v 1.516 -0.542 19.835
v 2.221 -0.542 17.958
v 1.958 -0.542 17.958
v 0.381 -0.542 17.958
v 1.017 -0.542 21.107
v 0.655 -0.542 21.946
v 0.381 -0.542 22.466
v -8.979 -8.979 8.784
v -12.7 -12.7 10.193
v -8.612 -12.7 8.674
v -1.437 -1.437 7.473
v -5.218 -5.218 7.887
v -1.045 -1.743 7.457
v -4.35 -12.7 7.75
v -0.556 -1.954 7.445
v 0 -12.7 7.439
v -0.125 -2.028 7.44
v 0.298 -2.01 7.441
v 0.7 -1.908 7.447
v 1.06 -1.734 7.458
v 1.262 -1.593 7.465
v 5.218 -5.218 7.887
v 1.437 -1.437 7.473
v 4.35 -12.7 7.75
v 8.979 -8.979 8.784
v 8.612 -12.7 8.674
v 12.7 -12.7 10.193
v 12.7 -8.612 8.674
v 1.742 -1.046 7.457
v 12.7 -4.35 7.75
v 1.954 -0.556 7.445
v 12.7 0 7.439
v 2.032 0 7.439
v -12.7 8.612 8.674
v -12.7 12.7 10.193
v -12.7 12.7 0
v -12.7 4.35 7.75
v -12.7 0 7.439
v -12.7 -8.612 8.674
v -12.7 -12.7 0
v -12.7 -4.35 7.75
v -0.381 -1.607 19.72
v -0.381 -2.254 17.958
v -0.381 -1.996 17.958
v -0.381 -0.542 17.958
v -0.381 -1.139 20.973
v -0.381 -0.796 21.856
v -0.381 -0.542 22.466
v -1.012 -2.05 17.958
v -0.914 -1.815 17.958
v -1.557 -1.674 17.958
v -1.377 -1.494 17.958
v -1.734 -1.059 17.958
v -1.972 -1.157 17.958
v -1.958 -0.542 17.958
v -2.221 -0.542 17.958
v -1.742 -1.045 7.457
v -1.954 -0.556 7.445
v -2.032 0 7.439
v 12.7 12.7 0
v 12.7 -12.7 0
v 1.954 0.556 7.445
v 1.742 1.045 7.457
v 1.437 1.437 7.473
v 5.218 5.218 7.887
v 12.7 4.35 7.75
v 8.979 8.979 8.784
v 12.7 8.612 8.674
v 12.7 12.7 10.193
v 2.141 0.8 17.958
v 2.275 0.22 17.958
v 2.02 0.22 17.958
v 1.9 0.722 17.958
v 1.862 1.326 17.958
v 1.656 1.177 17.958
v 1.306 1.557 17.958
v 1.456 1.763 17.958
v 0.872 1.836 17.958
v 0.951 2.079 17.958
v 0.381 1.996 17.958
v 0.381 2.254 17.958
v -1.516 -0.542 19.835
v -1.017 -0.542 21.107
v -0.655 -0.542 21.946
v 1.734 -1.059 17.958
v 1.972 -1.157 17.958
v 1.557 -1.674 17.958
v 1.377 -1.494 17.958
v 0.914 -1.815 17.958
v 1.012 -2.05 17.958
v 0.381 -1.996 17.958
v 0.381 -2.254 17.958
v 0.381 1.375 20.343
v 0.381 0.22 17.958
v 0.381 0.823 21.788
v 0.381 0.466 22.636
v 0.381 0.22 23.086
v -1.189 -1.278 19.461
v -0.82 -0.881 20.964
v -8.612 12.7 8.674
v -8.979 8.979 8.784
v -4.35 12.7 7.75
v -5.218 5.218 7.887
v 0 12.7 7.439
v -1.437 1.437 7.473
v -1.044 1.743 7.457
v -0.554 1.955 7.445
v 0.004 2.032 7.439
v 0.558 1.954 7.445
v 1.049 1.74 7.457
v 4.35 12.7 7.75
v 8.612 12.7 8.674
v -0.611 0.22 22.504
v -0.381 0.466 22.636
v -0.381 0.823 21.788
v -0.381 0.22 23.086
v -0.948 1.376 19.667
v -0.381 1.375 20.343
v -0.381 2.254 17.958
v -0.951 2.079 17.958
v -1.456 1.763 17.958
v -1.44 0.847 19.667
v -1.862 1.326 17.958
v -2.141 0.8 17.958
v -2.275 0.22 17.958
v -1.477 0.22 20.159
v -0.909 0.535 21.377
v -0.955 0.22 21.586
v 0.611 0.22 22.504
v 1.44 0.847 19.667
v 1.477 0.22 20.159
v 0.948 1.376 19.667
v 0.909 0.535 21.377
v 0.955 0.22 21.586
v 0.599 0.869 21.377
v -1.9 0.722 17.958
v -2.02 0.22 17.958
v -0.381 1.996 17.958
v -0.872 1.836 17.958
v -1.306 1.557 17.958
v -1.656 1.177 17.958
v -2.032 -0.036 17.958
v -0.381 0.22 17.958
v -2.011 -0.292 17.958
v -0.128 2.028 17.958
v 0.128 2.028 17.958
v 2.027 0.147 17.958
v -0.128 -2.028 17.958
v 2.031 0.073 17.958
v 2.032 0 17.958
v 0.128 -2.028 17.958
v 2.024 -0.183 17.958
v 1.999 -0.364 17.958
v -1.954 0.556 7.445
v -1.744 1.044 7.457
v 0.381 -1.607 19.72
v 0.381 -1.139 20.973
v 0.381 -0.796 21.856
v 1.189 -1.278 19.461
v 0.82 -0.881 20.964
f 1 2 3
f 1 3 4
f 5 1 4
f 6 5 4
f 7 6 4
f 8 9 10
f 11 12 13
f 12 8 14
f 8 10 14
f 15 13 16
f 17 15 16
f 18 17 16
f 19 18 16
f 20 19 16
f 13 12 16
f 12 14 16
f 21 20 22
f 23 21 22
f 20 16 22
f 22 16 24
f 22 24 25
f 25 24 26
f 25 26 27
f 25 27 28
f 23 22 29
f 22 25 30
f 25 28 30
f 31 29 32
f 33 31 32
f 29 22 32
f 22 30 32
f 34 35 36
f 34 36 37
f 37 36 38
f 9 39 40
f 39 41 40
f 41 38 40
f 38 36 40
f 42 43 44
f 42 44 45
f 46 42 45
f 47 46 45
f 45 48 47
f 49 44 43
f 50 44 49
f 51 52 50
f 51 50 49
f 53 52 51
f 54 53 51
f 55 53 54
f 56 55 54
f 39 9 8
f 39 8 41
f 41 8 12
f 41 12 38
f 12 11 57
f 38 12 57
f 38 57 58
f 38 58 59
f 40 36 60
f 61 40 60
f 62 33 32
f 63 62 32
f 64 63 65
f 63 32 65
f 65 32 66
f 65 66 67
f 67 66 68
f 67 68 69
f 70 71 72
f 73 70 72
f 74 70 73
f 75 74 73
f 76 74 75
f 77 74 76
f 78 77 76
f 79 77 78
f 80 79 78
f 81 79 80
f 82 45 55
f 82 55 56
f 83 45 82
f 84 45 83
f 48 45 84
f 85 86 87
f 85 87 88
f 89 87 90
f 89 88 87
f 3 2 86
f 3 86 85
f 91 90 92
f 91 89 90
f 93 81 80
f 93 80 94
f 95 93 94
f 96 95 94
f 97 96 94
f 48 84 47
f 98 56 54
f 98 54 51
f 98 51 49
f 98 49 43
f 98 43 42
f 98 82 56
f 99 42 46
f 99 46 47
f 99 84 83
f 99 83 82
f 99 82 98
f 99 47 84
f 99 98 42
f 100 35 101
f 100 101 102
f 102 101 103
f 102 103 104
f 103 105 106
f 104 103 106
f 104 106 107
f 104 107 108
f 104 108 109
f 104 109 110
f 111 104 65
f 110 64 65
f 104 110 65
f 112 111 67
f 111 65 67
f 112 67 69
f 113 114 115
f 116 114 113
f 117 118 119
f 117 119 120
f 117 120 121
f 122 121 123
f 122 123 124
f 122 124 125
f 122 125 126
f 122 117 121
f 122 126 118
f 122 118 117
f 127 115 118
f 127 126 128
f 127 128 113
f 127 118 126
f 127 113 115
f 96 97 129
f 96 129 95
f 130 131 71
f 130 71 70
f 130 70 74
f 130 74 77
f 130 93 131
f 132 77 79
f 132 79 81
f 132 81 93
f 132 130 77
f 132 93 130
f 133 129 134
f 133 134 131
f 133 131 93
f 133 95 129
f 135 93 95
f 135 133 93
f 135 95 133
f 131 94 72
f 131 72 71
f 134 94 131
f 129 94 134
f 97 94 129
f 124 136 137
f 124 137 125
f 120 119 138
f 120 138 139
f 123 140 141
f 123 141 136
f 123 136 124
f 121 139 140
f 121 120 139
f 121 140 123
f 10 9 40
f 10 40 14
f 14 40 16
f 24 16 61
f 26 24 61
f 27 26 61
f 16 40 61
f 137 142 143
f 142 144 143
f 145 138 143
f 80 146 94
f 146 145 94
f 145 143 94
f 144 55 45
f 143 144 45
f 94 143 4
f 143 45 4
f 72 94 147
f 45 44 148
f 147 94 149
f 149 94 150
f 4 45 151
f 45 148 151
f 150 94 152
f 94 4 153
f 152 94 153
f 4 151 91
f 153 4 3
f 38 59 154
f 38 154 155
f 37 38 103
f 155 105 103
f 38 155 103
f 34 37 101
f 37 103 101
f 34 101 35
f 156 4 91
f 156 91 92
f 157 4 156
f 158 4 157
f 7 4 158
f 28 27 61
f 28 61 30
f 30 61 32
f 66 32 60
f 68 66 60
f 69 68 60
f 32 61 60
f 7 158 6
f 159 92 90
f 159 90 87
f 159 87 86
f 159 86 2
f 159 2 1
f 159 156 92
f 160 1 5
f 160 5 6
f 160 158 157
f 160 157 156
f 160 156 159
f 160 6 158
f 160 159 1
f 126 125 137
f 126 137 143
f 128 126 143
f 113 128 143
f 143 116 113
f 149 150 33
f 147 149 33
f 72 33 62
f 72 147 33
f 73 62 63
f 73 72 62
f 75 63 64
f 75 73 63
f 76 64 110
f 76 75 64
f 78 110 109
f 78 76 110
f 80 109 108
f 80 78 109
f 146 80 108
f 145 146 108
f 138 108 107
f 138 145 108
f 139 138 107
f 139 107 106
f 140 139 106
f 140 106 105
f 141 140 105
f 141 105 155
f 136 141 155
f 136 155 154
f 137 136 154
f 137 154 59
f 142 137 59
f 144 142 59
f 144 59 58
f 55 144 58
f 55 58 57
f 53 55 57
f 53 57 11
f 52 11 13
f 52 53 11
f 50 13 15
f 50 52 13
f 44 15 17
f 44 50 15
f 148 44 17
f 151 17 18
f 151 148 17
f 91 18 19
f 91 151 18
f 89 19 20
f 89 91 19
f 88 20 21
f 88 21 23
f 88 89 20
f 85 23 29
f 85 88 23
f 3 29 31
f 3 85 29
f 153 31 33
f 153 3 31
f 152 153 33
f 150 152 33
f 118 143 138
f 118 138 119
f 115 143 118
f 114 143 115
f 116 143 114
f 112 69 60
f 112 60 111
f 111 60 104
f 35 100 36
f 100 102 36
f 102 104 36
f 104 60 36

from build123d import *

# Parameters (mm, degrees)
F0_W      = 12.7
F0_H      = 12.7
F1_DEPTH  = 12.7
F2_W      = 25.4
F2_H      = 25.4
F3_DEPTH  = 25.4
F5_DEPTH  = 25.4
F9_W      = 2.032
F9_H      = 12.7
F11_W     = 0.381
F11_H     = 0.5424337578
F11_H_2   = 0.2195662422
F13_DEPTH = 6.35


with BuildPart() as f1:
    # F0 (on Top) → F1 (new body)
    with BuildSketch(Plane.XY):
        with Locations((-6.35, 6.35)):
            Rectangle(F0_W, F0_H)
        with Locations((6.35, 6.35)):
            Rectangle(F0_W, F0_H)
        with Locations((-6.35, -6.35)):
            Rectangle(F0_W, F0_H)
        with Locations((6.35, -6.35)):
            Rectangle(F0_W, F0_H)
    extrude(amount=F1_DEPTH)

    # F2 (on face) → F3 (cut)
    with BuildSketch(Plane.XZ.offset(12.7)):
        with BuildLine():
            ThreePointArc((30.6605122425, 38.1), (-16.5933496542, 63.8823148345), (-12.7, 10.1934235175))
            Line((-12.7, 10.1934235175), (-12.7, 12.7))
            Line((-12.7, 12.7), (-12.7, 38.1))
            Line((-12.7, 38.1), (12.7, 38.1))
            Line((12.7, 38.1), (12.7, 12.7))
            Line((12.7, 12.7), (12.7, 10.1934235175))
            ThreePointArc((12.7, 10.1934235175), (25.7823148345, 21.5066503458), (30.6605122425, 38.1))
        make_face()
        with Locations((0, 25.4)):
            Rectangle(F2_W, F2_H)
        with BuildLine():
            Line((-12.7, 12.7), (-12.7, 10.1934235175))
            ThreePointArc((-12.7, 10.1934235175), (0, 7.4394877575), (12.7, 10.1934235175))
            Line((12.7, 10.1934235175), (12.7, 12.7))
            Line((12.7, 12.7), (-12.7, 12.7))
        make_face()
    extrude(amount=-F3_DEPTH, mode=Mode.SUBTRACT)

    # F4 (on face) → F5 (cut)
    with BuildSketch(Plane.YZ.offset(12.7)):
        Polygon((-12.7, 38.1), (-12.7, 10.1934235175), (0, 38.1), align=None)
        Polygon((12.7, 38.1), (0, 38.1), (12.7, 10.1934235175), align=None)
        with BuildLine():
            Line((12.7, 10.1934235175), (-12.7, 10.1934235175))
            ThreePointArc((-12.7, 10.1934235175), (-6.4975795911, 8.1358802828), (0, 7.4394877575))
            ThreePointArc((0, 7.4394877575), (6.4975795911, 8.1358802828), (12.7, 10.1934235175))
        make_face()
    extrude(amount=-F5_DEPTH, mode=Mode.SUBTRACT)

    # F9 (on offset) → F12 (revolve)
    with BuildSketch(Plane.XZ):
        Polygon((0, 17.9578), (2.032, 17.9578), (2.286, 17.9578), (0, 24.3078), align=None)
        with Locations((1.016, 11.6078)):
            Rectangle(F9_W, F9_H)
    revolve(axis=Axis((0, 0, 11.6078), (0, 0, 1)))

    # F11 (on offset) → F13 (cut)
    with BuildSketch(Plane(origin=(0, 0, 24.3078), x_dir=(1, 0, 0), z_dir=(0, 0, -1))):
        Polygon((0.381, 0.5424337578), (0.381, 2.286), (-0.381, 2.286), (-0.381, 0.5424337578), (0, 0.5424337578), align=None)
        Polygon((2.286, 0.5424337578), (0.381, 0.5424337578), (0.381, 0), (0.381, -0.2195662422), (2.286, -0.2195662422), align=None)
        with Locations((0.1905, 0.2712168789)):
            Rectangle(F11_W, F11_H)
        with Locations((-0.1905, 0.2712168789)):
            Rectangle(F11_W, F11_H)
        Polygon((-0.381, 0), (-0.381, 0.5424337578), (-2.286, 0.5424337578), (-2.286, -0.2195662422), (-0.381, -0.2195662422), align=None)
        with Locations((0.1905, -0.1097831211)):
            Rectangle(F11_W, F11_H_2)
        with Locations((-0.1905, -0.1097831211)):
            Rectangle(F11_W, F11_H_2)
        Polygon((0.381, -2.286), (0.381, -0.2195662422), (0, -0.2195662422), (-0.381, -0.2195662422), (-0.381, -2.286), align=None)
    extrude(amount=F13_DEPTH, mode=Mode.SUBTRACT)


solid = f1.part
